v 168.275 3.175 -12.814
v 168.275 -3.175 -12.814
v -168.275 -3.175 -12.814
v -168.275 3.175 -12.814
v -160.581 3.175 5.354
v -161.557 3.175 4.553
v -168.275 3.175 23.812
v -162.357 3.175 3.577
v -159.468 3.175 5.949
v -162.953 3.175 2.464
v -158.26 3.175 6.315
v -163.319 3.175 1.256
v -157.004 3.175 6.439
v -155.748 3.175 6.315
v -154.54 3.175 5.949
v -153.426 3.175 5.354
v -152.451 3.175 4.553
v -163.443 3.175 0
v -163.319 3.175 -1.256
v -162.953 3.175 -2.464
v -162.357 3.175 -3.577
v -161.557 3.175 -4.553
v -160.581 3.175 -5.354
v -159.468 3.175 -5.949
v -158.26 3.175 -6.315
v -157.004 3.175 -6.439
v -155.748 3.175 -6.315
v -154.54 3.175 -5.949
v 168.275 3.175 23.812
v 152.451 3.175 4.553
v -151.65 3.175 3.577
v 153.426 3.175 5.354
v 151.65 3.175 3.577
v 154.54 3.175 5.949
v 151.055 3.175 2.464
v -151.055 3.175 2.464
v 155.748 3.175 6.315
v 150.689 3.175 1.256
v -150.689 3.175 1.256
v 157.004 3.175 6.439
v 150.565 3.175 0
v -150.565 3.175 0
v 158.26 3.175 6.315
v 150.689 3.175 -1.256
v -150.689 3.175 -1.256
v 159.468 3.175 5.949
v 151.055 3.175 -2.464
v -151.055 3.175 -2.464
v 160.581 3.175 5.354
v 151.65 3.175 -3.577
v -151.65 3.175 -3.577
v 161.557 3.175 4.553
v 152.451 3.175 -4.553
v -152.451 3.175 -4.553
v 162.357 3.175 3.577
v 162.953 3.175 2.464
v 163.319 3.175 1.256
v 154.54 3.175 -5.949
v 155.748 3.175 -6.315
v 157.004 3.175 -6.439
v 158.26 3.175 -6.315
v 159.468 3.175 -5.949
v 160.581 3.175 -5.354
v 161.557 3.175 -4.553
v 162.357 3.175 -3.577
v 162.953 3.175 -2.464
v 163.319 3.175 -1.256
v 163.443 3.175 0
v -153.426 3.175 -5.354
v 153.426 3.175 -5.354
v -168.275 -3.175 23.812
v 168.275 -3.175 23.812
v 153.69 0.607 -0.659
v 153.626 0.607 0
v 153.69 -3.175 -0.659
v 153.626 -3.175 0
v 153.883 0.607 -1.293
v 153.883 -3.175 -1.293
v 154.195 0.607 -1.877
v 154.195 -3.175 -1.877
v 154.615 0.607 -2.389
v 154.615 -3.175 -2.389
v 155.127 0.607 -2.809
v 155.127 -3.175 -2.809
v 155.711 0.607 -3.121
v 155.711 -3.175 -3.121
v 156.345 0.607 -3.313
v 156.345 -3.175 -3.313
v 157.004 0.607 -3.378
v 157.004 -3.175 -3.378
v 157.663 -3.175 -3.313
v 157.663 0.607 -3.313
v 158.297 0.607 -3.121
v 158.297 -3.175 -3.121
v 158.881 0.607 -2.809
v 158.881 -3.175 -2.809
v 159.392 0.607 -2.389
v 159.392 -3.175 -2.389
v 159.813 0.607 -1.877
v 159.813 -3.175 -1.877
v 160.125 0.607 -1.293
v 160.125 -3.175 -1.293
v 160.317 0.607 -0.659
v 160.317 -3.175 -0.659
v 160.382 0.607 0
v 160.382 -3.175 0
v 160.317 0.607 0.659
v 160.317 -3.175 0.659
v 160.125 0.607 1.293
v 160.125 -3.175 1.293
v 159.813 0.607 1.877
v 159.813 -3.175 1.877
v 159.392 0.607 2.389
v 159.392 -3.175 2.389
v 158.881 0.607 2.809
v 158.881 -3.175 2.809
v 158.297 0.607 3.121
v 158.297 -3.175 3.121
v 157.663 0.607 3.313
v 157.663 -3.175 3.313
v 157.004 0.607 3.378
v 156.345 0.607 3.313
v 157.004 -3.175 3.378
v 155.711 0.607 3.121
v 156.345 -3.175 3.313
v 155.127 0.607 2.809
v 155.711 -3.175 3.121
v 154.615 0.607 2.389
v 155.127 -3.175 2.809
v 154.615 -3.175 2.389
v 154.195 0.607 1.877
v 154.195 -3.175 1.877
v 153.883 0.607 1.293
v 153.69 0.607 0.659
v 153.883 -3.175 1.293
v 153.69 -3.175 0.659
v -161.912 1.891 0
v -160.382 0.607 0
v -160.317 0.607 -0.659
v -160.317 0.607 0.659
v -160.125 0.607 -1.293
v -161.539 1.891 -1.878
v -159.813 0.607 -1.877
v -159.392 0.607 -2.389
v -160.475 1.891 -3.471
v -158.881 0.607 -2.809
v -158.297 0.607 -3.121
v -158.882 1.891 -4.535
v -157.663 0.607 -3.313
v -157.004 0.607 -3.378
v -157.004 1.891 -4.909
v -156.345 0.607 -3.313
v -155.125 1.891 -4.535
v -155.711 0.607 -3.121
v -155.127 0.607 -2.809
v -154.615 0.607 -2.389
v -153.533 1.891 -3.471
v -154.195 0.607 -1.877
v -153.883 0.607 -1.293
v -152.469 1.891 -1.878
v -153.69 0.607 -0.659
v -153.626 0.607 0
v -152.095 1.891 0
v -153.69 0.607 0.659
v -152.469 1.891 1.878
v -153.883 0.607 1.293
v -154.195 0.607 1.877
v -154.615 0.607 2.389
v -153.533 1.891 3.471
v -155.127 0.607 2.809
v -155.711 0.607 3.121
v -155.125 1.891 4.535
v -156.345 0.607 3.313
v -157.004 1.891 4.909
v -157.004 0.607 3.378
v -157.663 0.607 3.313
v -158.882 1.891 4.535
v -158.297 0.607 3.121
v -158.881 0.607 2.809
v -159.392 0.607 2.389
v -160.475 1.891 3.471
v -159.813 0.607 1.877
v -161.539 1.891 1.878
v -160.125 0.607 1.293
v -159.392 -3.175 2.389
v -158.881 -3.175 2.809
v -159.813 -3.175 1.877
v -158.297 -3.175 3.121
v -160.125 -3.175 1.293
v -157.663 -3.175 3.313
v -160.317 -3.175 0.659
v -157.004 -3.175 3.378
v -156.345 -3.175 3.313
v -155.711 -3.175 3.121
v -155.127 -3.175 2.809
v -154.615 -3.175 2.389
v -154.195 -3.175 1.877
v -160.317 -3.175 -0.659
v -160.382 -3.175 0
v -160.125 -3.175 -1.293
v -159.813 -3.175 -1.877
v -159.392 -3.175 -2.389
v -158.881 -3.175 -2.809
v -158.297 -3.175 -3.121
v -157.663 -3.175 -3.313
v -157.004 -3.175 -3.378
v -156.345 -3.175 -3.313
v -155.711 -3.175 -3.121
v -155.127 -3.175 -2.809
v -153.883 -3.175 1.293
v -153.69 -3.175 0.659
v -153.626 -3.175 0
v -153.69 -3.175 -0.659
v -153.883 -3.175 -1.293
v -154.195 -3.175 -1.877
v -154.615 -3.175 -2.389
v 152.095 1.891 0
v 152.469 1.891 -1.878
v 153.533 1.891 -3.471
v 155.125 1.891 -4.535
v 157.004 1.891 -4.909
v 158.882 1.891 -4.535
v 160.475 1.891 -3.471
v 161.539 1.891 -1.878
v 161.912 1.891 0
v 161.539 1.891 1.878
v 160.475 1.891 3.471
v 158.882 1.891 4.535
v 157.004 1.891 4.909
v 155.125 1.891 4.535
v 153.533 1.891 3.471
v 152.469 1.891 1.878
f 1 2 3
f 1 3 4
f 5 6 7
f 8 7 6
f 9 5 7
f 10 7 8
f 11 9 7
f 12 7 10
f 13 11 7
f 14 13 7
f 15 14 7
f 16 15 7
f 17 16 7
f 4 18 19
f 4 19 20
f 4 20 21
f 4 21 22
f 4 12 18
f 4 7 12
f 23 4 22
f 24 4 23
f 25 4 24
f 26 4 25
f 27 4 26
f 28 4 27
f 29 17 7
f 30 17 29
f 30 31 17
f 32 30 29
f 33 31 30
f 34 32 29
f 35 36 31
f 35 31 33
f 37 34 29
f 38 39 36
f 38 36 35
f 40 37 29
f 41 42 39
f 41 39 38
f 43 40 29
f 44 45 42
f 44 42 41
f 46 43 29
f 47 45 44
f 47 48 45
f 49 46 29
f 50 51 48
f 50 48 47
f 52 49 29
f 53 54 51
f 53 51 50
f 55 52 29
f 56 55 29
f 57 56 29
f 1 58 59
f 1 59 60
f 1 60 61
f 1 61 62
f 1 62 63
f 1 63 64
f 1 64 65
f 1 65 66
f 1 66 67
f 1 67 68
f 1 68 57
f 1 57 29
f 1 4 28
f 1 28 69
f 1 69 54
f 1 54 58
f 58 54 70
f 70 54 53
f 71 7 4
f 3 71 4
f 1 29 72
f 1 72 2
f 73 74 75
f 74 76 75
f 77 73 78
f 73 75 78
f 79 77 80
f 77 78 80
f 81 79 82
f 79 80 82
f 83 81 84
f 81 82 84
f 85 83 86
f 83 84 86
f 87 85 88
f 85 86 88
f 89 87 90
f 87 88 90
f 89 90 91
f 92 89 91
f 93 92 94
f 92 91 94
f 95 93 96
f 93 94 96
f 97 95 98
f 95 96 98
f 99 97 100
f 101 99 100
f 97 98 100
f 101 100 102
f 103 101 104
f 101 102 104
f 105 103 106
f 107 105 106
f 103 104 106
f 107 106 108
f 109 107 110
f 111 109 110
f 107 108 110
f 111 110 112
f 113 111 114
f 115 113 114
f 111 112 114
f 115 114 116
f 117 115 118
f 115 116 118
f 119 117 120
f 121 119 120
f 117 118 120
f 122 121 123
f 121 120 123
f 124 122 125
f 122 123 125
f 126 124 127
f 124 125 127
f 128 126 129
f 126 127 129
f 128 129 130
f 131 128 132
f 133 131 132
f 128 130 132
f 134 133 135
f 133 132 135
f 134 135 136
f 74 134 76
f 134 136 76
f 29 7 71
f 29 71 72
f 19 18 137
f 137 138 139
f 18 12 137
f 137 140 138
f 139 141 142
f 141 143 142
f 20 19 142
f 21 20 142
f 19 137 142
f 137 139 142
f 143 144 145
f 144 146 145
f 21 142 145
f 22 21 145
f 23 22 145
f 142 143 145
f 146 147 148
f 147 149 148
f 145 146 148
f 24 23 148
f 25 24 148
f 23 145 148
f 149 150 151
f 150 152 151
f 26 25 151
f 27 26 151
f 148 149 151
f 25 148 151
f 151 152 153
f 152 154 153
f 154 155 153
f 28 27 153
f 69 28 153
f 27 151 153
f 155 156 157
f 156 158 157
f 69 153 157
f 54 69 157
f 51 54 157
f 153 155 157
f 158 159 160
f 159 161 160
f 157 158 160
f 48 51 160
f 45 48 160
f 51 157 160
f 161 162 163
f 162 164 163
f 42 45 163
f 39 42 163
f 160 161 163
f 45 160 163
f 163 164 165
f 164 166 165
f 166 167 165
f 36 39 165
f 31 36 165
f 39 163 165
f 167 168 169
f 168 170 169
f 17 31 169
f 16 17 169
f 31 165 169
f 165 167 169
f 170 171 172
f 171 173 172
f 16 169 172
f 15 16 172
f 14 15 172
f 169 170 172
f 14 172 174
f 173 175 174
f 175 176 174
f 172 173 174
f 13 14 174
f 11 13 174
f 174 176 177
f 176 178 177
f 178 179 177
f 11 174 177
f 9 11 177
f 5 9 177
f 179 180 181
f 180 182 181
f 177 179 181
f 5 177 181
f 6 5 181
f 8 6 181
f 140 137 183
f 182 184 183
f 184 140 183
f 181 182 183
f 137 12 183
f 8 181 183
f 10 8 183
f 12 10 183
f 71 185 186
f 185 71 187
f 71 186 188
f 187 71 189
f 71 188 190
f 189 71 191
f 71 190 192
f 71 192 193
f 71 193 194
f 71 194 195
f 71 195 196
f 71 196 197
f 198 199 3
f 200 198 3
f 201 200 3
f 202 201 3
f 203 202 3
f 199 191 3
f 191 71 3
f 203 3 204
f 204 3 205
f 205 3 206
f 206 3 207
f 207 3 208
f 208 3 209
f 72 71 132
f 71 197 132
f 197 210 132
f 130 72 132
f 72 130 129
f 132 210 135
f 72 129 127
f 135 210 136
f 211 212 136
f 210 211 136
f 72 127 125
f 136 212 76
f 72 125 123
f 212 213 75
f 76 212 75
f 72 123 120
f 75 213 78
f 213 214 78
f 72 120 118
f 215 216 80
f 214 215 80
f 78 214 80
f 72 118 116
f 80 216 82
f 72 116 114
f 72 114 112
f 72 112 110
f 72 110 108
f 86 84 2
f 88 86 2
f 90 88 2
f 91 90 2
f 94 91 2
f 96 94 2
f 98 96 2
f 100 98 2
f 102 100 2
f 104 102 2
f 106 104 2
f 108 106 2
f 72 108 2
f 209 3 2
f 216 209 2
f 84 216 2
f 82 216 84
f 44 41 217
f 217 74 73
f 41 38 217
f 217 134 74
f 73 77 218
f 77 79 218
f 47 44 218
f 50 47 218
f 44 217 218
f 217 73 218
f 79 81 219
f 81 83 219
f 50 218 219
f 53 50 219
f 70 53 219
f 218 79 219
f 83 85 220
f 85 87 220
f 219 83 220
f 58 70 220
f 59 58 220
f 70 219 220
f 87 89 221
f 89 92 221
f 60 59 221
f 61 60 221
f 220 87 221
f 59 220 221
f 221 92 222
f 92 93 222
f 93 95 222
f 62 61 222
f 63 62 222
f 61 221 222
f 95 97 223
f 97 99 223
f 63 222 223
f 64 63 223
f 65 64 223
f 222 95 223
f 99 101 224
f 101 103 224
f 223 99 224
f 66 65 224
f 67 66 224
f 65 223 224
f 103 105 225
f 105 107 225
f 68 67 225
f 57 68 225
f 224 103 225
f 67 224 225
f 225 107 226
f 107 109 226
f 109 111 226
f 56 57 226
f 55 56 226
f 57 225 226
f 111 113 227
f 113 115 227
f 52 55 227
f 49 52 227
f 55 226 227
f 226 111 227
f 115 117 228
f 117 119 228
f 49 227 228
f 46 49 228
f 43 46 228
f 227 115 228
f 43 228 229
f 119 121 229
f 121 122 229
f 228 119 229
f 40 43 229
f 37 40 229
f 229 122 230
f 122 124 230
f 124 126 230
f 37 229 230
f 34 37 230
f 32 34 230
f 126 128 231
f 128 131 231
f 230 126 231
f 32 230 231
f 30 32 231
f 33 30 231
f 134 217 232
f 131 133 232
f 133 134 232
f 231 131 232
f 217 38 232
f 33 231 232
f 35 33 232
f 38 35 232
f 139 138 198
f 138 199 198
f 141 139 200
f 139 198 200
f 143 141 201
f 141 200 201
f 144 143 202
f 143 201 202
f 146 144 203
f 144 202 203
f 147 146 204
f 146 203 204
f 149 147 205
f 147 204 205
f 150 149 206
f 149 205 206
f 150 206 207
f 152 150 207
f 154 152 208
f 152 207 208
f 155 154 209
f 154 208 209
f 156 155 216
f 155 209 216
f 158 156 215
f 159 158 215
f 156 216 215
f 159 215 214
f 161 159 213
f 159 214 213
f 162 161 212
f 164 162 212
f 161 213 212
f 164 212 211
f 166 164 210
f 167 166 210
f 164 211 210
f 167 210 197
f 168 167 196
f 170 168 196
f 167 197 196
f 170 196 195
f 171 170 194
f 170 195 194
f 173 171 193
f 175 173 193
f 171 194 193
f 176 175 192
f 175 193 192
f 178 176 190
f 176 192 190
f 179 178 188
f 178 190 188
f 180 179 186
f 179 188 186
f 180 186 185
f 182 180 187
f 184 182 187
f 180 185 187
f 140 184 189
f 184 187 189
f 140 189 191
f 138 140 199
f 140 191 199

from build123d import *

# Parameters (mm, degrees)
SKETCH1_W                                           = 336.55
SKETCH1_H                                           = 47.625
BOSS_EXTRUDE1_DEPTH                                 = 3.175
CSK_FOR_1_4_FLAT_HEAD_MACHINE_SCREW_100_D           = 6.7564
CSK_FOR_1_4_FLAT_HEAD_MACHINE_SCREW_100_CSINK_D     = 12.8778
CSK_FOR_1_4_FLAT_HEAD_MACHINE_SCREW_100_CSINK_ANGLE = 100
SKETCH4_W                                           = 10.998522628
SKETCH4_H                                           = 6.35
CUT_EXTRUDE1_DEPTH                                  = 1
CUT_EXTRUDE1_DEPTH_BACK                             = 337.55


with BuildPart() as part:
    # Sketch1 → Boss-Extrude1 (new body, symmetric)
    with BuildSketch(Plane(origin=(0, 0, 0), x_dir=(1, 0, 0), z_dir=(0, 1, 0))):
        Rectangle(SKETCH1_W, SKETCH1_H)
    extrude(amount=BOSS_EXTRUDE1_DEPTH, both=True)

    # CSK for 1/4 Flat Head Machine Screw (100)1 (through all)
    with Locations(Plane(origin=(0, 3.175, 0), x_dir=(1, 0, 0), z_dir=(0, 1, 0))):
        with Locations((-157.00375, 0), (157.00375, 0)):
            CounterSinkHole(CSK_FOR_1_4_FLAT_HEAD_MACHINE_SCREW_100_D / 2, CSK_FOR_1_4_FLAT_HEAD_MACHINE_SCREW_100_CSINK_D / 2, counter_sink_angle=CSK_FOR_1_4_FLAT_HEAD_MACHINE_SCREW_100_CSINK_ANGLE)

    # Sketch4 → Cut-Extrude1 (cut, two sides)
    with BuildSketch(Plane.ZY.offset(168.275)) as cut_extrude1_sk:
        with Locations((-18.313238686, 0)):
            Rectangle(SKETCH4_W, SKETCH4_H)
    extrude(amount=CUT_EXTRUDE1_DEPTH, mode=Mode.SUBTRACT)
    extrude(cut_extrude1_sk.sketch, amount=-CUT_EXTRUDE1_DEPTH_BACK, mode=Mode.SUBTRACT)


solid = part.part
